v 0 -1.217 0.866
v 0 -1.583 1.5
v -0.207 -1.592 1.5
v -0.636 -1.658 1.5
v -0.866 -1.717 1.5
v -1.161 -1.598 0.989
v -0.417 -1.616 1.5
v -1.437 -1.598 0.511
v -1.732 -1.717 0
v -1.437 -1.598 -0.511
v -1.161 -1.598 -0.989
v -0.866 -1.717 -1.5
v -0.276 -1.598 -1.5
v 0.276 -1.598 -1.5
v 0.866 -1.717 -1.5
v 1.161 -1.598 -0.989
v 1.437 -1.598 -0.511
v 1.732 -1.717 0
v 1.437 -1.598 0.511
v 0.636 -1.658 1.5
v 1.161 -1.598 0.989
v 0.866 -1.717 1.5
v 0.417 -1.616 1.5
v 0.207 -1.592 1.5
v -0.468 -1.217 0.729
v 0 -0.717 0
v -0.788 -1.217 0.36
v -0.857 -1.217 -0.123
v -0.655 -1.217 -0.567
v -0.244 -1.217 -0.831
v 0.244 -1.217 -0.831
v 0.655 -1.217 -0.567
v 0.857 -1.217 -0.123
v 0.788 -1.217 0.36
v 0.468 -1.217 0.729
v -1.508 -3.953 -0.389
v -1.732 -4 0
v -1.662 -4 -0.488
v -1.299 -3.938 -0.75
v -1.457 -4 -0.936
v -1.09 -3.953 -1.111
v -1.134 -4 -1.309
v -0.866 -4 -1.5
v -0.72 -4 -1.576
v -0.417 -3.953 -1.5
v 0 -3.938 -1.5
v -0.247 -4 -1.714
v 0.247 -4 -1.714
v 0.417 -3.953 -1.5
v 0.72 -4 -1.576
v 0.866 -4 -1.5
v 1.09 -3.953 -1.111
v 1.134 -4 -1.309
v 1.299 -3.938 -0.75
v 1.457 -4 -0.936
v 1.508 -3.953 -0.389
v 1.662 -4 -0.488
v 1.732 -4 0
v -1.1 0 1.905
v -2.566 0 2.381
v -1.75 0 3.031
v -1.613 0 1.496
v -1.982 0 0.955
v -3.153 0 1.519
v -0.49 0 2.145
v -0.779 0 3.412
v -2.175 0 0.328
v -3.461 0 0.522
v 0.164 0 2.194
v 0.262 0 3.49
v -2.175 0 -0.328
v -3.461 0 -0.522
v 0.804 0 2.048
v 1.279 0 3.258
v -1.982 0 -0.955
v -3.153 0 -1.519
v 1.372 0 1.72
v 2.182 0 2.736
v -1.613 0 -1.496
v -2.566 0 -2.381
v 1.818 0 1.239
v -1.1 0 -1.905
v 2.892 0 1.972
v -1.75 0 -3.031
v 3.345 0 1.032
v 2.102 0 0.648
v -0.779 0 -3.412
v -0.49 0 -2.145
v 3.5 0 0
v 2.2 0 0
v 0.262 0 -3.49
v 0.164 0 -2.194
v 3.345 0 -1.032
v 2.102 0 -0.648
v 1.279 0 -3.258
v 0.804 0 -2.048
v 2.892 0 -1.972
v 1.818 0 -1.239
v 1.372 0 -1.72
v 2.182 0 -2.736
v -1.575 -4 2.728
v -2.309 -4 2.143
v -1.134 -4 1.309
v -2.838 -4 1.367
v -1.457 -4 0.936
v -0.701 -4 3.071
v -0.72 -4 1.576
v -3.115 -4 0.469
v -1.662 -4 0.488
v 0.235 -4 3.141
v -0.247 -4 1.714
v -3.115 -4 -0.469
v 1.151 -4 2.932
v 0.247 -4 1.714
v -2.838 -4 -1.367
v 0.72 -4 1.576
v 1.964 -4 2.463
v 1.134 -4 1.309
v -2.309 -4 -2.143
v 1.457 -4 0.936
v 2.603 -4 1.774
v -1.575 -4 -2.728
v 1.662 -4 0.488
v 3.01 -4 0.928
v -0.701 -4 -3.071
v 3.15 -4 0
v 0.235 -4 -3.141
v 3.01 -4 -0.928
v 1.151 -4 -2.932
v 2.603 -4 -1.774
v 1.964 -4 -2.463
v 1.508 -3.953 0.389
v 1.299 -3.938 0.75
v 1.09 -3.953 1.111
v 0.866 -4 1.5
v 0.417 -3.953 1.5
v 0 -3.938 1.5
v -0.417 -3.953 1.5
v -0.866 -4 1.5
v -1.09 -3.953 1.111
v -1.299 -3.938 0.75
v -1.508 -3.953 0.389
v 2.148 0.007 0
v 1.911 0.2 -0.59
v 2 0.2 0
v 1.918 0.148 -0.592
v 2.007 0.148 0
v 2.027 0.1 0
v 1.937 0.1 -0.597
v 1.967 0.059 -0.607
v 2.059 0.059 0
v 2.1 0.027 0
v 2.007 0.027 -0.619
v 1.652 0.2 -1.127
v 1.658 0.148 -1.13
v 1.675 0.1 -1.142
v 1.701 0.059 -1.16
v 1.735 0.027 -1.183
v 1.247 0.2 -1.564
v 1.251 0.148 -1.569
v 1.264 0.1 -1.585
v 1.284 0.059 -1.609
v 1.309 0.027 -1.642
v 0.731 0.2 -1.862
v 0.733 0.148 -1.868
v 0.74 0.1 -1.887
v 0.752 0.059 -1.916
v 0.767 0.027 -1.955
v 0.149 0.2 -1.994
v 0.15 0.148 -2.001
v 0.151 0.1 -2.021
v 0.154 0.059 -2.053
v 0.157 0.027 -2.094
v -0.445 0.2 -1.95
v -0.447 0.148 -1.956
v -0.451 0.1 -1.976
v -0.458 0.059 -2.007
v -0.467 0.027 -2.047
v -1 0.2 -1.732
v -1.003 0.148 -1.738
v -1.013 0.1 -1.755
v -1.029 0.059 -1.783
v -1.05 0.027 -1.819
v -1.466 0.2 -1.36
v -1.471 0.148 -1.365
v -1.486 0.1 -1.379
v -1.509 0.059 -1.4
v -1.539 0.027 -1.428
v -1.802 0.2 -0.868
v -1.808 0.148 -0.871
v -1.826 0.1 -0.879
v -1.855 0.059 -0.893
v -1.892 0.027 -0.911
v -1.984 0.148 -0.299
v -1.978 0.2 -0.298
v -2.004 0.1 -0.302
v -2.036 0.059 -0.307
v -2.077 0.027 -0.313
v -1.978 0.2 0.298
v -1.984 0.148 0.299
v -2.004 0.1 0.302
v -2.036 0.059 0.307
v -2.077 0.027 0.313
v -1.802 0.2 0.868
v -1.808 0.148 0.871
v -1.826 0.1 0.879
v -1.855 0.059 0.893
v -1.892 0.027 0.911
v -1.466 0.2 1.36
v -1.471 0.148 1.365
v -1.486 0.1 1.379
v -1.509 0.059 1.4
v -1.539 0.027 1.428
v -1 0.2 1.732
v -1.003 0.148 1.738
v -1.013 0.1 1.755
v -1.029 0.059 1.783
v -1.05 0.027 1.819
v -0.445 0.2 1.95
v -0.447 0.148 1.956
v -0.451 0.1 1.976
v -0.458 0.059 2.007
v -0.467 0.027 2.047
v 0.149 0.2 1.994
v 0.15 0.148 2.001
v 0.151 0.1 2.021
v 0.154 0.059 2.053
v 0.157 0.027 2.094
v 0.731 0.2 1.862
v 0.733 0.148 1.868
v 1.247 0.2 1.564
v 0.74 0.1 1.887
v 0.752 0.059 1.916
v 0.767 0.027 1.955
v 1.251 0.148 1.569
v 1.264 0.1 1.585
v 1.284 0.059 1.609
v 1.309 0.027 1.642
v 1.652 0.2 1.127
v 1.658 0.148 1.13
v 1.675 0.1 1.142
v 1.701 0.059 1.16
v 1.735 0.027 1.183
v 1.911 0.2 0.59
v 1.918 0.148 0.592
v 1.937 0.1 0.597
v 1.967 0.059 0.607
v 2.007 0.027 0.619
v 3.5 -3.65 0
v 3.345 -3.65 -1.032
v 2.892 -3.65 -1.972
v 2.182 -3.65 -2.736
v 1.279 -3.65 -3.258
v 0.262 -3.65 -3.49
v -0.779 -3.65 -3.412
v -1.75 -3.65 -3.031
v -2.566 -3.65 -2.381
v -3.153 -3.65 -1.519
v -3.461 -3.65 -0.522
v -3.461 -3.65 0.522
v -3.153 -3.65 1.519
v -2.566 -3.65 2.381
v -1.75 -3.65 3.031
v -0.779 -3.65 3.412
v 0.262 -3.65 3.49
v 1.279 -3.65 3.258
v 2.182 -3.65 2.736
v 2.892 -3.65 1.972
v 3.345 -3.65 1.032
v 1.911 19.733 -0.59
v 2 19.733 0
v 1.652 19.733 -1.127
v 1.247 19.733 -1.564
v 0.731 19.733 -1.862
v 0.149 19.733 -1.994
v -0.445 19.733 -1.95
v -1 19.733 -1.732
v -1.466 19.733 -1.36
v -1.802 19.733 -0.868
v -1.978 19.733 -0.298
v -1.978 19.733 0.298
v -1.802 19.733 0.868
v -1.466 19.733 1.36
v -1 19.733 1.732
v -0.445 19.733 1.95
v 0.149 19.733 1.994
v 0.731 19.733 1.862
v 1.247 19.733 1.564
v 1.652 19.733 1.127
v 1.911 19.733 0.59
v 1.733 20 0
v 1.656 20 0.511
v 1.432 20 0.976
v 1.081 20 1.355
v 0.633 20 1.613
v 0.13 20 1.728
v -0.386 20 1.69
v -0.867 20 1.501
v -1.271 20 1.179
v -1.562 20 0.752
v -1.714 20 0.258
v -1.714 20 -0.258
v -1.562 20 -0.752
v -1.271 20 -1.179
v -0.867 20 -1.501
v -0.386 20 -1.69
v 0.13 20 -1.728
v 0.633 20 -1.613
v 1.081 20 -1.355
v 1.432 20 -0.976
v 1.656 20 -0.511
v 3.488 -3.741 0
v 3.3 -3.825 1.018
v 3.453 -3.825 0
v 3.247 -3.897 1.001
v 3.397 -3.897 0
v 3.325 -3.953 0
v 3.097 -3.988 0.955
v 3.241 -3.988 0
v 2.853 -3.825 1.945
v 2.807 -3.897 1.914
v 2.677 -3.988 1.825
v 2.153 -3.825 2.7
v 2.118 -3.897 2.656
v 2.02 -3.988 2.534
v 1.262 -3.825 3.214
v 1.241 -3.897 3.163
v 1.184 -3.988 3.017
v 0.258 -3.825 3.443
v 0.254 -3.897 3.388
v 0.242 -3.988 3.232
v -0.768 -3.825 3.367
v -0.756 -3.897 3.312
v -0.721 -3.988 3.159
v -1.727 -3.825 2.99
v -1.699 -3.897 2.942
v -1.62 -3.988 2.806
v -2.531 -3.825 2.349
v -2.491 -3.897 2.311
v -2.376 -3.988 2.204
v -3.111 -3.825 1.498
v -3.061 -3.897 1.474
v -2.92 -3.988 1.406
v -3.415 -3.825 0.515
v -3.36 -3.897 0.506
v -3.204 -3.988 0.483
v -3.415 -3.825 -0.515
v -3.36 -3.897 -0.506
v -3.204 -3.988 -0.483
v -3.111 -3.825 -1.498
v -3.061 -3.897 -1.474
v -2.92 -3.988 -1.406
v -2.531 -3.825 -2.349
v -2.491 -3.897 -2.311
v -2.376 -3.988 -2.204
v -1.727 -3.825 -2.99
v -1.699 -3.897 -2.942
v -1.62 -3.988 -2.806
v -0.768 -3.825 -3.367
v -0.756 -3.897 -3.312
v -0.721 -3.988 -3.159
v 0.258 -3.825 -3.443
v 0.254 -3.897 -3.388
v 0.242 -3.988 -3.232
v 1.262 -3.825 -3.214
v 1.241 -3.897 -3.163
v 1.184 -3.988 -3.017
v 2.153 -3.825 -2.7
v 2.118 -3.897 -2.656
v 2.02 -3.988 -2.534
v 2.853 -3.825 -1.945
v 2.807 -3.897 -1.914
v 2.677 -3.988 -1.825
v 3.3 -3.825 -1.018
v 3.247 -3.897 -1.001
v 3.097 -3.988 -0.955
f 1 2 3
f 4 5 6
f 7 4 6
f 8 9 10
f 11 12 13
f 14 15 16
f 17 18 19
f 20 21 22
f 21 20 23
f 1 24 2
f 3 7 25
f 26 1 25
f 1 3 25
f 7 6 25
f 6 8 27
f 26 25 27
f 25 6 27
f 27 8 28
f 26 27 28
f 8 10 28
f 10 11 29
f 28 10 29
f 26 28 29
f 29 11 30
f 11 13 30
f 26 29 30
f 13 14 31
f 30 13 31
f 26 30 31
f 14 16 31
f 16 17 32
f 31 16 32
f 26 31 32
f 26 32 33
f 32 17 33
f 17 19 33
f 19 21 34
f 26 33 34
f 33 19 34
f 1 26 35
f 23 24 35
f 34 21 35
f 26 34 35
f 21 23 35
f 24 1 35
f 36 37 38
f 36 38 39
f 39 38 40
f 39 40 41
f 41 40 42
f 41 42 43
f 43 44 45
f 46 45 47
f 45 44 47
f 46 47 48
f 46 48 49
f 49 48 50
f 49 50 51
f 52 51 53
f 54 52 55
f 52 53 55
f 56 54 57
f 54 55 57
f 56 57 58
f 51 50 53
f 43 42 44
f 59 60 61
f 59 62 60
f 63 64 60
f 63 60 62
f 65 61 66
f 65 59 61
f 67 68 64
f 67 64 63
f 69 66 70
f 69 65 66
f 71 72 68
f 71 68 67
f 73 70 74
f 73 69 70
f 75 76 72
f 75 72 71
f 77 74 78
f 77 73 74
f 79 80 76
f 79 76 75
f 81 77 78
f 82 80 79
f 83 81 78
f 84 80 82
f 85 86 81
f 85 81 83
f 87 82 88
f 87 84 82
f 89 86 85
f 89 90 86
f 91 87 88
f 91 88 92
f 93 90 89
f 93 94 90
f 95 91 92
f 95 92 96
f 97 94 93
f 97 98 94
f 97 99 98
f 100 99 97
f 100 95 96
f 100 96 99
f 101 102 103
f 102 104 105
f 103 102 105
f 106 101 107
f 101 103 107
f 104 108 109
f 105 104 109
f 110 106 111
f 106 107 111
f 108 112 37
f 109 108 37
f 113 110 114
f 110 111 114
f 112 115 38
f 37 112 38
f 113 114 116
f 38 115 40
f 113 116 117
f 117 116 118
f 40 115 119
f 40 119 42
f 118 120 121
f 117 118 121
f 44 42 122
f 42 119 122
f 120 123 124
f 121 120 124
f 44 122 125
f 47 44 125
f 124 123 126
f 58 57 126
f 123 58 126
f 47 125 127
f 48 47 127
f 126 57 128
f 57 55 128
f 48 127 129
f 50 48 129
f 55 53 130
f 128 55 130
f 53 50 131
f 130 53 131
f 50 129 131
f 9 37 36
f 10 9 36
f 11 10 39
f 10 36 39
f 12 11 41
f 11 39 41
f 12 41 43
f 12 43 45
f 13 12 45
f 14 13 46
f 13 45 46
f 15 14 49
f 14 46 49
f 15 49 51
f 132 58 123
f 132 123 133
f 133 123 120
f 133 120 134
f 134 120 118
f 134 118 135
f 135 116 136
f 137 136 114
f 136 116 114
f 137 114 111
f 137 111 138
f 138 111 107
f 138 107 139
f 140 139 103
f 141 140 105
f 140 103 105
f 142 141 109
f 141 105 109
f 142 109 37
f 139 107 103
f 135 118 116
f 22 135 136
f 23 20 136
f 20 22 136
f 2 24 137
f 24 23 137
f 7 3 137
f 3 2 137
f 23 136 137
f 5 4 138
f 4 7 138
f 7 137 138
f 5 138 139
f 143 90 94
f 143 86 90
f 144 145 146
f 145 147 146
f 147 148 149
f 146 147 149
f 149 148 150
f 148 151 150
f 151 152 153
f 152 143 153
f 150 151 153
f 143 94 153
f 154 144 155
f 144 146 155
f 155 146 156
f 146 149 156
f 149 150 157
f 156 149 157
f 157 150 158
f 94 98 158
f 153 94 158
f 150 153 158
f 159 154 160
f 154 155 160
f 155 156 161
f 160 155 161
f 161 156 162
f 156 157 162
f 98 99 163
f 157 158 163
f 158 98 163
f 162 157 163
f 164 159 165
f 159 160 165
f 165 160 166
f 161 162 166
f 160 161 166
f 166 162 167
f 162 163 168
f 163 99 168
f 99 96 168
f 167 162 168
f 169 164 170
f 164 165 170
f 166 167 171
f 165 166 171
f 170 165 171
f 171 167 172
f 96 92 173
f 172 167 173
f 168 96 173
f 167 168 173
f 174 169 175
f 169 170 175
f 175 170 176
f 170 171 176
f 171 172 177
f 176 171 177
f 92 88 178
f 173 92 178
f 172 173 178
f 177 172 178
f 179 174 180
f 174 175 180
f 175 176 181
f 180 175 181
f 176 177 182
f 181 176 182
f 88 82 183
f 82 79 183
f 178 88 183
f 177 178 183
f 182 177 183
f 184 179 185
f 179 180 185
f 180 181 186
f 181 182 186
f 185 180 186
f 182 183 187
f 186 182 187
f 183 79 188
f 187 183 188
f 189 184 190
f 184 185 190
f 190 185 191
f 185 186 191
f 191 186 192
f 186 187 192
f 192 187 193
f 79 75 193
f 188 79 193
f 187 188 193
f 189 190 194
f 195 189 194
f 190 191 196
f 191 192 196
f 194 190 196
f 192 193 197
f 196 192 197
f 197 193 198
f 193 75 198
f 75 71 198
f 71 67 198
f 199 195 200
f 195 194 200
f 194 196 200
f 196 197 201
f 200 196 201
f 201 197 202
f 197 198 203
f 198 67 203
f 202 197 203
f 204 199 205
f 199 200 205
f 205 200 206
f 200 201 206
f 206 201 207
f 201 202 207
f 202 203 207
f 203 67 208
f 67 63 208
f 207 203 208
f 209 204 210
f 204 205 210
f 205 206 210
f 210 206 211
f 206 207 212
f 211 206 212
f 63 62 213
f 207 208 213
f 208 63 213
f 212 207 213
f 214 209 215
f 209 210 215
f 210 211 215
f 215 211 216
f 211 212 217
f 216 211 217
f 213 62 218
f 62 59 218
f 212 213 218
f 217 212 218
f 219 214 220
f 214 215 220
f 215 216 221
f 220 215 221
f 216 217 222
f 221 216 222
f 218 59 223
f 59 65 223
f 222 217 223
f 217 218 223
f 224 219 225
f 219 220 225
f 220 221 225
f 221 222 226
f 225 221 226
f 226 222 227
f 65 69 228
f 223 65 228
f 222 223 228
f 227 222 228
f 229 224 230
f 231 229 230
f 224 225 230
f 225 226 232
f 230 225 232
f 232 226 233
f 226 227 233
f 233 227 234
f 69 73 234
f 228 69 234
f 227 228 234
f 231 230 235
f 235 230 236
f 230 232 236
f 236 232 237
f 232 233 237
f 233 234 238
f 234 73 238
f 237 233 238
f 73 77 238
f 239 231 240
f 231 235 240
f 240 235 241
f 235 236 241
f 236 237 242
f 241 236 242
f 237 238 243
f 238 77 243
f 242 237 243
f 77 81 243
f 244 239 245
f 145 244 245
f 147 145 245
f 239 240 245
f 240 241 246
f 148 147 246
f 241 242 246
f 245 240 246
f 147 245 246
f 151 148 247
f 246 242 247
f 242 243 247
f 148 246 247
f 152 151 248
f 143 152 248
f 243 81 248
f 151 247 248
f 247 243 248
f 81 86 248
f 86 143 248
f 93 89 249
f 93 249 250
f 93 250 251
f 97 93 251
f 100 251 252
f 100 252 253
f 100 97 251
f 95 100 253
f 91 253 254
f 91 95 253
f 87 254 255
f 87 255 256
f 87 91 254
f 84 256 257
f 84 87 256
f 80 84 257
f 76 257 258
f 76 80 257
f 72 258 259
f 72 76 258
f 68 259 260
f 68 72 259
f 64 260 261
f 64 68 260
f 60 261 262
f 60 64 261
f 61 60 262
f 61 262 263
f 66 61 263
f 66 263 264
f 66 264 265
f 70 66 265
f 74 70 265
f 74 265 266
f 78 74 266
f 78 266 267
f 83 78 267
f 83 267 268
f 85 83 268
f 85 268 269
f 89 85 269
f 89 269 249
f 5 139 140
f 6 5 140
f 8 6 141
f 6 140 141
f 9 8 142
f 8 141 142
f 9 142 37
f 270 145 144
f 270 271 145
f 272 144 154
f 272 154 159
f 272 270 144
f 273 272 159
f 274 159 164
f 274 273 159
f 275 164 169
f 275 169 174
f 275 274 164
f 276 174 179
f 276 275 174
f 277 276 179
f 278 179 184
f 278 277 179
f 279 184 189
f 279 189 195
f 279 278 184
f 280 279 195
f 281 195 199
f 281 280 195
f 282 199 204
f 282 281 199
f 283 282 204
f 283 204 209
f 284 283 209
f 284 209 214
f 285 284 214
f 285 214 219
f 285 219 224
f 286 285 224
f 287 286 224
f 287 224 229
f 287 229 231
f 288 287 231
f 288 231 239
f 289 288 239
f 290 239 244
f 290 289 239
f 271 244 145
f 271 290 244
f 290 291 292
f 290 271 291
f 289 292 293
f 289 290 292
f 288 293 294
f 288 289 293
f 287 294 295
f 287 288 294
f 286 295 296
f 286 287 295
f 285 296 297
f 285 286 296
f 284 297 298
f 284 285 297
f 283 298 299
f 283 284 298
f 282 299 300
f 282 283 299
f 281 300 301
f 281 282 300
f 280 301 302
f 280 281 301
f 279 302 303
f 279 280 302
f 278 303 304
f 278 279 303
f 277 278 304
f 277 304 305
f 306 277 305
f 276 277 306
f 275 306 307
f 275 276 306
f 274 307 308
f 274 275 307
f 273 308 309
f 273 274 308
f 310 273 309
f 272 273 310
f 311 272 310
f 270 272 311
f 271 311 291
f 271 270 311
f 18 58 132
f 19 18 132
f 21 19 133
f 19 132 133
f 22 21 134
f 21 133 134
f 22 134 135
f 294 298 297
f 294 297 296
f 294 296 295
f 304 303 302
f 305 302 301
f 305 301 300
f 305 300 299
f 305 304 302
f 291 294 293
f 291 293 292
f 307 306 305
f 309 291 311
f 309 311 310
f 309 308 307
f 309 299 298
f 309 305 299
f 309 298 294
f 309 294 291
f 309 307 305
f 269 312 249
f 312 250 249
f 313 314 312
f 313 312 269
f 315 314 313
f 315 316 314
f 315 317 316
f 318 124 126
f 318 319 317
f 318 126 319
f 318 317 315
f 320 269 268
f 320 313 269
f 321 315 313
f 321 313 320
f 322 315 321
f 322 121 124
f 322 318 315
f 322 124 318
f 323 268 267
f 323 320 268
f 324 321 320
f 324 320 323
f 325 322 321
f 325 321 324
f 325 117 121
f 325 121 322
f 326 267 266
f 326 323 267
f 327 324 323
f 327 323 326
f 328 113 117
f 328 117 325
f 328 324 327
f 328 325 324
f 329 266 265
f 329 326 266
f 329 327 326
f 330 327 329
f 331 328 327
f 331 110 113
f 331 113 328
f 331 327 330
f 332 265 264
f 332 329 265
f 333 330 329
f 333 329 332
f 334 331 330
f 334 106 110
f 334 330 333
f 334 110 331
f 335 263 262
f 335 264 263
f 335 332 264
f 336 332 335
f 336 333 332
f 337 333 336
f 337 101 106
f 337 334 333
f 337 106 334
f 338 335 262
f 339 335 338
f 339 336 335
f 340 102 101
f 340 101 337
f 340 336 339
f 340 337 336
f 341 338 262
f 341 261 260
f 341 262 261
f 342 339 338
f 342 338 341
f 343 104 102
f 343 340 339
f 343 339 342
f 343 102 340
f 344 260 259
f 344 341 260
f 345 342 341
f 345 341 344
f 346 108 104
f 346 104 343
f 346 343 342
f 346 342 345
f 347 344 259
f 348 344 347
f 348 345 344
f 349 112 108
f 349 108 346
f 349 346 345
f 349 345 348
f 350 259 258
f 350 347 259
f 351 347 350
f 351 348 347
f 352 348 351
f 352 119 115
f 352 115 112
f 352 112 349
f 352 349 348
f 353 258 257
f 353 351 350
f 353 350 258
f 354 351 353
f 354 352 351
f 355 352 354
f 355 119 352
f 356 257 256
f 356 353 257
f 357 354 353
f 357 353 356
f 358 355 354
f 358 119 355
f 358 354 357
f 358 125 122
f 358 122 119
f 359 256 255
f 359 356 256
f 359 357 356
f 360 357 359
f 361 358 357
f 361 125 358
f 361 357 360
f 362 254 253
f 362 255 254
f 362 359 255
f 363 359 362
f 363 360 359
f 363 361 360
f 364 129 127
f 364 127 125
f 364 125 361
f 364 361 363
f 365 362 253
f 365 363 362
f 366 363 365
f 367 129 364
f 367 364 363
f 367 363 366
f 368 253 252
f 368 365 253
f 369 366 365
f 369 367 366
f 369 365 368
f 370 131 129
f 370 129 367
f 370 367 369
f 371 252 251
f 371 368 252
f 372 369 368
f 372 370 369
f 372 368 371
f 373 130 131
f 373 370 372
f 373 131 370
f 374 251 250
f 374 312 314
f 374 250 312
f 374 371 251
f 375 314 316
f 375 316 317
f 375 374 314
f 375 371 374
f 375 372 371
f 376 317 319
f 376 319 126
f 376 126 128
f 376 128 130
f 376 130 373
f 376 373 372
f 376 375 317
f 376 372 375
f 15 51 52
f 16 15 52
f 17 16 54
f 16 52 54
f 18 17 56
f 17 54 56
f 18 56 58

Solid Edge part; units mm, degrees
sketch "Sketch1" plane through (0, 0, 0) normal (0, 0, 1) x (1, 0, 0)
  line L0 (2, 0) -> (2, 20)
  line L1 (0, 20) -> (2, 20)
  line L2 (0, 0) -> (0, 20)
  line L3 (0, 0) -> (0, -4)
  line L4 (0, -4) -> (3.5, -4)
  line L5 (3.5, -4) -> (3.5, 0)
  line L6 (3.5, 0) -> (2, 0)
revolve "RevolvedProtrusion1" add sketch "Sketch1" angle 360 about axis through (0, 0, 0) along (0, 1, 0)
sketch "Sketch2" plane through (0, 0, 0) normal (1, 0, 0) x (0, 1, 0)
  line L0 (-4, 2.2215) -> (-2, 2.2215)
  line L1 (-0.7174, 0) -> (-2, 2.2215)
  line L2 (-4, 0) -> (-0.7174, 0)
  line L3 (-4, 0) -> (-4, 2.2215)
revolve "RevolvedCutout1" cut sketch "Sketch2" angle 360 about axis through (0, -4.5, 0) along (0, 1, 0)
sketch "Sketch3" plane through (0, -4, 0) normal (0, -1, 0) x (0, 0, 1)
  circle A0 centre (0, 0) radius 2.2215
  line L0 (-1.5, -0.866) -> (0, -1.7321)
  line L1 (0, -1.7321) -> (1.5, -0.866)
  line L2 (1.5, -0.866) -> (1.5, 0.866)
  line L3 (1.5, 0.866) -> (0, 1.7321)
  line L4 (0, 1.7321) -> (-1.5, 0.866)
  line L5 (-1.5, 0.866) -> (-1.5, -0.866)
  dimension "D1" = 3
extrude "Protrusion1" add sketch "Sketch3" against normal up to next
sketch "Sketch4" plane through (0, 0, 0) normal (0, 0, 1) x (1, 0, 0)
  line L0 (-1.7321, -4) -> (0, -4)
  line L1 (0, -4) -> (0, -3.5359)
  line L2 (0, -3.5359) -> (-1.7321, -4)
revolve "RevolvedCutout2" cut sketch "Sketch4" angle 360 about axis through (0, -4.5, 0) along (0, 1, 0)
fillet "Round1" radius 0.2 1 edges at (0, 0, -2)
fillet "Round2" radius 0.35 1 edges at (0, -4, -3.5)
chamfer "倒斜角_2" distance 0.2667 angle 45 1 edges at (0, 20, -2)
cosmetic_thread "螺纹_3" size "M4" thread depth 16
